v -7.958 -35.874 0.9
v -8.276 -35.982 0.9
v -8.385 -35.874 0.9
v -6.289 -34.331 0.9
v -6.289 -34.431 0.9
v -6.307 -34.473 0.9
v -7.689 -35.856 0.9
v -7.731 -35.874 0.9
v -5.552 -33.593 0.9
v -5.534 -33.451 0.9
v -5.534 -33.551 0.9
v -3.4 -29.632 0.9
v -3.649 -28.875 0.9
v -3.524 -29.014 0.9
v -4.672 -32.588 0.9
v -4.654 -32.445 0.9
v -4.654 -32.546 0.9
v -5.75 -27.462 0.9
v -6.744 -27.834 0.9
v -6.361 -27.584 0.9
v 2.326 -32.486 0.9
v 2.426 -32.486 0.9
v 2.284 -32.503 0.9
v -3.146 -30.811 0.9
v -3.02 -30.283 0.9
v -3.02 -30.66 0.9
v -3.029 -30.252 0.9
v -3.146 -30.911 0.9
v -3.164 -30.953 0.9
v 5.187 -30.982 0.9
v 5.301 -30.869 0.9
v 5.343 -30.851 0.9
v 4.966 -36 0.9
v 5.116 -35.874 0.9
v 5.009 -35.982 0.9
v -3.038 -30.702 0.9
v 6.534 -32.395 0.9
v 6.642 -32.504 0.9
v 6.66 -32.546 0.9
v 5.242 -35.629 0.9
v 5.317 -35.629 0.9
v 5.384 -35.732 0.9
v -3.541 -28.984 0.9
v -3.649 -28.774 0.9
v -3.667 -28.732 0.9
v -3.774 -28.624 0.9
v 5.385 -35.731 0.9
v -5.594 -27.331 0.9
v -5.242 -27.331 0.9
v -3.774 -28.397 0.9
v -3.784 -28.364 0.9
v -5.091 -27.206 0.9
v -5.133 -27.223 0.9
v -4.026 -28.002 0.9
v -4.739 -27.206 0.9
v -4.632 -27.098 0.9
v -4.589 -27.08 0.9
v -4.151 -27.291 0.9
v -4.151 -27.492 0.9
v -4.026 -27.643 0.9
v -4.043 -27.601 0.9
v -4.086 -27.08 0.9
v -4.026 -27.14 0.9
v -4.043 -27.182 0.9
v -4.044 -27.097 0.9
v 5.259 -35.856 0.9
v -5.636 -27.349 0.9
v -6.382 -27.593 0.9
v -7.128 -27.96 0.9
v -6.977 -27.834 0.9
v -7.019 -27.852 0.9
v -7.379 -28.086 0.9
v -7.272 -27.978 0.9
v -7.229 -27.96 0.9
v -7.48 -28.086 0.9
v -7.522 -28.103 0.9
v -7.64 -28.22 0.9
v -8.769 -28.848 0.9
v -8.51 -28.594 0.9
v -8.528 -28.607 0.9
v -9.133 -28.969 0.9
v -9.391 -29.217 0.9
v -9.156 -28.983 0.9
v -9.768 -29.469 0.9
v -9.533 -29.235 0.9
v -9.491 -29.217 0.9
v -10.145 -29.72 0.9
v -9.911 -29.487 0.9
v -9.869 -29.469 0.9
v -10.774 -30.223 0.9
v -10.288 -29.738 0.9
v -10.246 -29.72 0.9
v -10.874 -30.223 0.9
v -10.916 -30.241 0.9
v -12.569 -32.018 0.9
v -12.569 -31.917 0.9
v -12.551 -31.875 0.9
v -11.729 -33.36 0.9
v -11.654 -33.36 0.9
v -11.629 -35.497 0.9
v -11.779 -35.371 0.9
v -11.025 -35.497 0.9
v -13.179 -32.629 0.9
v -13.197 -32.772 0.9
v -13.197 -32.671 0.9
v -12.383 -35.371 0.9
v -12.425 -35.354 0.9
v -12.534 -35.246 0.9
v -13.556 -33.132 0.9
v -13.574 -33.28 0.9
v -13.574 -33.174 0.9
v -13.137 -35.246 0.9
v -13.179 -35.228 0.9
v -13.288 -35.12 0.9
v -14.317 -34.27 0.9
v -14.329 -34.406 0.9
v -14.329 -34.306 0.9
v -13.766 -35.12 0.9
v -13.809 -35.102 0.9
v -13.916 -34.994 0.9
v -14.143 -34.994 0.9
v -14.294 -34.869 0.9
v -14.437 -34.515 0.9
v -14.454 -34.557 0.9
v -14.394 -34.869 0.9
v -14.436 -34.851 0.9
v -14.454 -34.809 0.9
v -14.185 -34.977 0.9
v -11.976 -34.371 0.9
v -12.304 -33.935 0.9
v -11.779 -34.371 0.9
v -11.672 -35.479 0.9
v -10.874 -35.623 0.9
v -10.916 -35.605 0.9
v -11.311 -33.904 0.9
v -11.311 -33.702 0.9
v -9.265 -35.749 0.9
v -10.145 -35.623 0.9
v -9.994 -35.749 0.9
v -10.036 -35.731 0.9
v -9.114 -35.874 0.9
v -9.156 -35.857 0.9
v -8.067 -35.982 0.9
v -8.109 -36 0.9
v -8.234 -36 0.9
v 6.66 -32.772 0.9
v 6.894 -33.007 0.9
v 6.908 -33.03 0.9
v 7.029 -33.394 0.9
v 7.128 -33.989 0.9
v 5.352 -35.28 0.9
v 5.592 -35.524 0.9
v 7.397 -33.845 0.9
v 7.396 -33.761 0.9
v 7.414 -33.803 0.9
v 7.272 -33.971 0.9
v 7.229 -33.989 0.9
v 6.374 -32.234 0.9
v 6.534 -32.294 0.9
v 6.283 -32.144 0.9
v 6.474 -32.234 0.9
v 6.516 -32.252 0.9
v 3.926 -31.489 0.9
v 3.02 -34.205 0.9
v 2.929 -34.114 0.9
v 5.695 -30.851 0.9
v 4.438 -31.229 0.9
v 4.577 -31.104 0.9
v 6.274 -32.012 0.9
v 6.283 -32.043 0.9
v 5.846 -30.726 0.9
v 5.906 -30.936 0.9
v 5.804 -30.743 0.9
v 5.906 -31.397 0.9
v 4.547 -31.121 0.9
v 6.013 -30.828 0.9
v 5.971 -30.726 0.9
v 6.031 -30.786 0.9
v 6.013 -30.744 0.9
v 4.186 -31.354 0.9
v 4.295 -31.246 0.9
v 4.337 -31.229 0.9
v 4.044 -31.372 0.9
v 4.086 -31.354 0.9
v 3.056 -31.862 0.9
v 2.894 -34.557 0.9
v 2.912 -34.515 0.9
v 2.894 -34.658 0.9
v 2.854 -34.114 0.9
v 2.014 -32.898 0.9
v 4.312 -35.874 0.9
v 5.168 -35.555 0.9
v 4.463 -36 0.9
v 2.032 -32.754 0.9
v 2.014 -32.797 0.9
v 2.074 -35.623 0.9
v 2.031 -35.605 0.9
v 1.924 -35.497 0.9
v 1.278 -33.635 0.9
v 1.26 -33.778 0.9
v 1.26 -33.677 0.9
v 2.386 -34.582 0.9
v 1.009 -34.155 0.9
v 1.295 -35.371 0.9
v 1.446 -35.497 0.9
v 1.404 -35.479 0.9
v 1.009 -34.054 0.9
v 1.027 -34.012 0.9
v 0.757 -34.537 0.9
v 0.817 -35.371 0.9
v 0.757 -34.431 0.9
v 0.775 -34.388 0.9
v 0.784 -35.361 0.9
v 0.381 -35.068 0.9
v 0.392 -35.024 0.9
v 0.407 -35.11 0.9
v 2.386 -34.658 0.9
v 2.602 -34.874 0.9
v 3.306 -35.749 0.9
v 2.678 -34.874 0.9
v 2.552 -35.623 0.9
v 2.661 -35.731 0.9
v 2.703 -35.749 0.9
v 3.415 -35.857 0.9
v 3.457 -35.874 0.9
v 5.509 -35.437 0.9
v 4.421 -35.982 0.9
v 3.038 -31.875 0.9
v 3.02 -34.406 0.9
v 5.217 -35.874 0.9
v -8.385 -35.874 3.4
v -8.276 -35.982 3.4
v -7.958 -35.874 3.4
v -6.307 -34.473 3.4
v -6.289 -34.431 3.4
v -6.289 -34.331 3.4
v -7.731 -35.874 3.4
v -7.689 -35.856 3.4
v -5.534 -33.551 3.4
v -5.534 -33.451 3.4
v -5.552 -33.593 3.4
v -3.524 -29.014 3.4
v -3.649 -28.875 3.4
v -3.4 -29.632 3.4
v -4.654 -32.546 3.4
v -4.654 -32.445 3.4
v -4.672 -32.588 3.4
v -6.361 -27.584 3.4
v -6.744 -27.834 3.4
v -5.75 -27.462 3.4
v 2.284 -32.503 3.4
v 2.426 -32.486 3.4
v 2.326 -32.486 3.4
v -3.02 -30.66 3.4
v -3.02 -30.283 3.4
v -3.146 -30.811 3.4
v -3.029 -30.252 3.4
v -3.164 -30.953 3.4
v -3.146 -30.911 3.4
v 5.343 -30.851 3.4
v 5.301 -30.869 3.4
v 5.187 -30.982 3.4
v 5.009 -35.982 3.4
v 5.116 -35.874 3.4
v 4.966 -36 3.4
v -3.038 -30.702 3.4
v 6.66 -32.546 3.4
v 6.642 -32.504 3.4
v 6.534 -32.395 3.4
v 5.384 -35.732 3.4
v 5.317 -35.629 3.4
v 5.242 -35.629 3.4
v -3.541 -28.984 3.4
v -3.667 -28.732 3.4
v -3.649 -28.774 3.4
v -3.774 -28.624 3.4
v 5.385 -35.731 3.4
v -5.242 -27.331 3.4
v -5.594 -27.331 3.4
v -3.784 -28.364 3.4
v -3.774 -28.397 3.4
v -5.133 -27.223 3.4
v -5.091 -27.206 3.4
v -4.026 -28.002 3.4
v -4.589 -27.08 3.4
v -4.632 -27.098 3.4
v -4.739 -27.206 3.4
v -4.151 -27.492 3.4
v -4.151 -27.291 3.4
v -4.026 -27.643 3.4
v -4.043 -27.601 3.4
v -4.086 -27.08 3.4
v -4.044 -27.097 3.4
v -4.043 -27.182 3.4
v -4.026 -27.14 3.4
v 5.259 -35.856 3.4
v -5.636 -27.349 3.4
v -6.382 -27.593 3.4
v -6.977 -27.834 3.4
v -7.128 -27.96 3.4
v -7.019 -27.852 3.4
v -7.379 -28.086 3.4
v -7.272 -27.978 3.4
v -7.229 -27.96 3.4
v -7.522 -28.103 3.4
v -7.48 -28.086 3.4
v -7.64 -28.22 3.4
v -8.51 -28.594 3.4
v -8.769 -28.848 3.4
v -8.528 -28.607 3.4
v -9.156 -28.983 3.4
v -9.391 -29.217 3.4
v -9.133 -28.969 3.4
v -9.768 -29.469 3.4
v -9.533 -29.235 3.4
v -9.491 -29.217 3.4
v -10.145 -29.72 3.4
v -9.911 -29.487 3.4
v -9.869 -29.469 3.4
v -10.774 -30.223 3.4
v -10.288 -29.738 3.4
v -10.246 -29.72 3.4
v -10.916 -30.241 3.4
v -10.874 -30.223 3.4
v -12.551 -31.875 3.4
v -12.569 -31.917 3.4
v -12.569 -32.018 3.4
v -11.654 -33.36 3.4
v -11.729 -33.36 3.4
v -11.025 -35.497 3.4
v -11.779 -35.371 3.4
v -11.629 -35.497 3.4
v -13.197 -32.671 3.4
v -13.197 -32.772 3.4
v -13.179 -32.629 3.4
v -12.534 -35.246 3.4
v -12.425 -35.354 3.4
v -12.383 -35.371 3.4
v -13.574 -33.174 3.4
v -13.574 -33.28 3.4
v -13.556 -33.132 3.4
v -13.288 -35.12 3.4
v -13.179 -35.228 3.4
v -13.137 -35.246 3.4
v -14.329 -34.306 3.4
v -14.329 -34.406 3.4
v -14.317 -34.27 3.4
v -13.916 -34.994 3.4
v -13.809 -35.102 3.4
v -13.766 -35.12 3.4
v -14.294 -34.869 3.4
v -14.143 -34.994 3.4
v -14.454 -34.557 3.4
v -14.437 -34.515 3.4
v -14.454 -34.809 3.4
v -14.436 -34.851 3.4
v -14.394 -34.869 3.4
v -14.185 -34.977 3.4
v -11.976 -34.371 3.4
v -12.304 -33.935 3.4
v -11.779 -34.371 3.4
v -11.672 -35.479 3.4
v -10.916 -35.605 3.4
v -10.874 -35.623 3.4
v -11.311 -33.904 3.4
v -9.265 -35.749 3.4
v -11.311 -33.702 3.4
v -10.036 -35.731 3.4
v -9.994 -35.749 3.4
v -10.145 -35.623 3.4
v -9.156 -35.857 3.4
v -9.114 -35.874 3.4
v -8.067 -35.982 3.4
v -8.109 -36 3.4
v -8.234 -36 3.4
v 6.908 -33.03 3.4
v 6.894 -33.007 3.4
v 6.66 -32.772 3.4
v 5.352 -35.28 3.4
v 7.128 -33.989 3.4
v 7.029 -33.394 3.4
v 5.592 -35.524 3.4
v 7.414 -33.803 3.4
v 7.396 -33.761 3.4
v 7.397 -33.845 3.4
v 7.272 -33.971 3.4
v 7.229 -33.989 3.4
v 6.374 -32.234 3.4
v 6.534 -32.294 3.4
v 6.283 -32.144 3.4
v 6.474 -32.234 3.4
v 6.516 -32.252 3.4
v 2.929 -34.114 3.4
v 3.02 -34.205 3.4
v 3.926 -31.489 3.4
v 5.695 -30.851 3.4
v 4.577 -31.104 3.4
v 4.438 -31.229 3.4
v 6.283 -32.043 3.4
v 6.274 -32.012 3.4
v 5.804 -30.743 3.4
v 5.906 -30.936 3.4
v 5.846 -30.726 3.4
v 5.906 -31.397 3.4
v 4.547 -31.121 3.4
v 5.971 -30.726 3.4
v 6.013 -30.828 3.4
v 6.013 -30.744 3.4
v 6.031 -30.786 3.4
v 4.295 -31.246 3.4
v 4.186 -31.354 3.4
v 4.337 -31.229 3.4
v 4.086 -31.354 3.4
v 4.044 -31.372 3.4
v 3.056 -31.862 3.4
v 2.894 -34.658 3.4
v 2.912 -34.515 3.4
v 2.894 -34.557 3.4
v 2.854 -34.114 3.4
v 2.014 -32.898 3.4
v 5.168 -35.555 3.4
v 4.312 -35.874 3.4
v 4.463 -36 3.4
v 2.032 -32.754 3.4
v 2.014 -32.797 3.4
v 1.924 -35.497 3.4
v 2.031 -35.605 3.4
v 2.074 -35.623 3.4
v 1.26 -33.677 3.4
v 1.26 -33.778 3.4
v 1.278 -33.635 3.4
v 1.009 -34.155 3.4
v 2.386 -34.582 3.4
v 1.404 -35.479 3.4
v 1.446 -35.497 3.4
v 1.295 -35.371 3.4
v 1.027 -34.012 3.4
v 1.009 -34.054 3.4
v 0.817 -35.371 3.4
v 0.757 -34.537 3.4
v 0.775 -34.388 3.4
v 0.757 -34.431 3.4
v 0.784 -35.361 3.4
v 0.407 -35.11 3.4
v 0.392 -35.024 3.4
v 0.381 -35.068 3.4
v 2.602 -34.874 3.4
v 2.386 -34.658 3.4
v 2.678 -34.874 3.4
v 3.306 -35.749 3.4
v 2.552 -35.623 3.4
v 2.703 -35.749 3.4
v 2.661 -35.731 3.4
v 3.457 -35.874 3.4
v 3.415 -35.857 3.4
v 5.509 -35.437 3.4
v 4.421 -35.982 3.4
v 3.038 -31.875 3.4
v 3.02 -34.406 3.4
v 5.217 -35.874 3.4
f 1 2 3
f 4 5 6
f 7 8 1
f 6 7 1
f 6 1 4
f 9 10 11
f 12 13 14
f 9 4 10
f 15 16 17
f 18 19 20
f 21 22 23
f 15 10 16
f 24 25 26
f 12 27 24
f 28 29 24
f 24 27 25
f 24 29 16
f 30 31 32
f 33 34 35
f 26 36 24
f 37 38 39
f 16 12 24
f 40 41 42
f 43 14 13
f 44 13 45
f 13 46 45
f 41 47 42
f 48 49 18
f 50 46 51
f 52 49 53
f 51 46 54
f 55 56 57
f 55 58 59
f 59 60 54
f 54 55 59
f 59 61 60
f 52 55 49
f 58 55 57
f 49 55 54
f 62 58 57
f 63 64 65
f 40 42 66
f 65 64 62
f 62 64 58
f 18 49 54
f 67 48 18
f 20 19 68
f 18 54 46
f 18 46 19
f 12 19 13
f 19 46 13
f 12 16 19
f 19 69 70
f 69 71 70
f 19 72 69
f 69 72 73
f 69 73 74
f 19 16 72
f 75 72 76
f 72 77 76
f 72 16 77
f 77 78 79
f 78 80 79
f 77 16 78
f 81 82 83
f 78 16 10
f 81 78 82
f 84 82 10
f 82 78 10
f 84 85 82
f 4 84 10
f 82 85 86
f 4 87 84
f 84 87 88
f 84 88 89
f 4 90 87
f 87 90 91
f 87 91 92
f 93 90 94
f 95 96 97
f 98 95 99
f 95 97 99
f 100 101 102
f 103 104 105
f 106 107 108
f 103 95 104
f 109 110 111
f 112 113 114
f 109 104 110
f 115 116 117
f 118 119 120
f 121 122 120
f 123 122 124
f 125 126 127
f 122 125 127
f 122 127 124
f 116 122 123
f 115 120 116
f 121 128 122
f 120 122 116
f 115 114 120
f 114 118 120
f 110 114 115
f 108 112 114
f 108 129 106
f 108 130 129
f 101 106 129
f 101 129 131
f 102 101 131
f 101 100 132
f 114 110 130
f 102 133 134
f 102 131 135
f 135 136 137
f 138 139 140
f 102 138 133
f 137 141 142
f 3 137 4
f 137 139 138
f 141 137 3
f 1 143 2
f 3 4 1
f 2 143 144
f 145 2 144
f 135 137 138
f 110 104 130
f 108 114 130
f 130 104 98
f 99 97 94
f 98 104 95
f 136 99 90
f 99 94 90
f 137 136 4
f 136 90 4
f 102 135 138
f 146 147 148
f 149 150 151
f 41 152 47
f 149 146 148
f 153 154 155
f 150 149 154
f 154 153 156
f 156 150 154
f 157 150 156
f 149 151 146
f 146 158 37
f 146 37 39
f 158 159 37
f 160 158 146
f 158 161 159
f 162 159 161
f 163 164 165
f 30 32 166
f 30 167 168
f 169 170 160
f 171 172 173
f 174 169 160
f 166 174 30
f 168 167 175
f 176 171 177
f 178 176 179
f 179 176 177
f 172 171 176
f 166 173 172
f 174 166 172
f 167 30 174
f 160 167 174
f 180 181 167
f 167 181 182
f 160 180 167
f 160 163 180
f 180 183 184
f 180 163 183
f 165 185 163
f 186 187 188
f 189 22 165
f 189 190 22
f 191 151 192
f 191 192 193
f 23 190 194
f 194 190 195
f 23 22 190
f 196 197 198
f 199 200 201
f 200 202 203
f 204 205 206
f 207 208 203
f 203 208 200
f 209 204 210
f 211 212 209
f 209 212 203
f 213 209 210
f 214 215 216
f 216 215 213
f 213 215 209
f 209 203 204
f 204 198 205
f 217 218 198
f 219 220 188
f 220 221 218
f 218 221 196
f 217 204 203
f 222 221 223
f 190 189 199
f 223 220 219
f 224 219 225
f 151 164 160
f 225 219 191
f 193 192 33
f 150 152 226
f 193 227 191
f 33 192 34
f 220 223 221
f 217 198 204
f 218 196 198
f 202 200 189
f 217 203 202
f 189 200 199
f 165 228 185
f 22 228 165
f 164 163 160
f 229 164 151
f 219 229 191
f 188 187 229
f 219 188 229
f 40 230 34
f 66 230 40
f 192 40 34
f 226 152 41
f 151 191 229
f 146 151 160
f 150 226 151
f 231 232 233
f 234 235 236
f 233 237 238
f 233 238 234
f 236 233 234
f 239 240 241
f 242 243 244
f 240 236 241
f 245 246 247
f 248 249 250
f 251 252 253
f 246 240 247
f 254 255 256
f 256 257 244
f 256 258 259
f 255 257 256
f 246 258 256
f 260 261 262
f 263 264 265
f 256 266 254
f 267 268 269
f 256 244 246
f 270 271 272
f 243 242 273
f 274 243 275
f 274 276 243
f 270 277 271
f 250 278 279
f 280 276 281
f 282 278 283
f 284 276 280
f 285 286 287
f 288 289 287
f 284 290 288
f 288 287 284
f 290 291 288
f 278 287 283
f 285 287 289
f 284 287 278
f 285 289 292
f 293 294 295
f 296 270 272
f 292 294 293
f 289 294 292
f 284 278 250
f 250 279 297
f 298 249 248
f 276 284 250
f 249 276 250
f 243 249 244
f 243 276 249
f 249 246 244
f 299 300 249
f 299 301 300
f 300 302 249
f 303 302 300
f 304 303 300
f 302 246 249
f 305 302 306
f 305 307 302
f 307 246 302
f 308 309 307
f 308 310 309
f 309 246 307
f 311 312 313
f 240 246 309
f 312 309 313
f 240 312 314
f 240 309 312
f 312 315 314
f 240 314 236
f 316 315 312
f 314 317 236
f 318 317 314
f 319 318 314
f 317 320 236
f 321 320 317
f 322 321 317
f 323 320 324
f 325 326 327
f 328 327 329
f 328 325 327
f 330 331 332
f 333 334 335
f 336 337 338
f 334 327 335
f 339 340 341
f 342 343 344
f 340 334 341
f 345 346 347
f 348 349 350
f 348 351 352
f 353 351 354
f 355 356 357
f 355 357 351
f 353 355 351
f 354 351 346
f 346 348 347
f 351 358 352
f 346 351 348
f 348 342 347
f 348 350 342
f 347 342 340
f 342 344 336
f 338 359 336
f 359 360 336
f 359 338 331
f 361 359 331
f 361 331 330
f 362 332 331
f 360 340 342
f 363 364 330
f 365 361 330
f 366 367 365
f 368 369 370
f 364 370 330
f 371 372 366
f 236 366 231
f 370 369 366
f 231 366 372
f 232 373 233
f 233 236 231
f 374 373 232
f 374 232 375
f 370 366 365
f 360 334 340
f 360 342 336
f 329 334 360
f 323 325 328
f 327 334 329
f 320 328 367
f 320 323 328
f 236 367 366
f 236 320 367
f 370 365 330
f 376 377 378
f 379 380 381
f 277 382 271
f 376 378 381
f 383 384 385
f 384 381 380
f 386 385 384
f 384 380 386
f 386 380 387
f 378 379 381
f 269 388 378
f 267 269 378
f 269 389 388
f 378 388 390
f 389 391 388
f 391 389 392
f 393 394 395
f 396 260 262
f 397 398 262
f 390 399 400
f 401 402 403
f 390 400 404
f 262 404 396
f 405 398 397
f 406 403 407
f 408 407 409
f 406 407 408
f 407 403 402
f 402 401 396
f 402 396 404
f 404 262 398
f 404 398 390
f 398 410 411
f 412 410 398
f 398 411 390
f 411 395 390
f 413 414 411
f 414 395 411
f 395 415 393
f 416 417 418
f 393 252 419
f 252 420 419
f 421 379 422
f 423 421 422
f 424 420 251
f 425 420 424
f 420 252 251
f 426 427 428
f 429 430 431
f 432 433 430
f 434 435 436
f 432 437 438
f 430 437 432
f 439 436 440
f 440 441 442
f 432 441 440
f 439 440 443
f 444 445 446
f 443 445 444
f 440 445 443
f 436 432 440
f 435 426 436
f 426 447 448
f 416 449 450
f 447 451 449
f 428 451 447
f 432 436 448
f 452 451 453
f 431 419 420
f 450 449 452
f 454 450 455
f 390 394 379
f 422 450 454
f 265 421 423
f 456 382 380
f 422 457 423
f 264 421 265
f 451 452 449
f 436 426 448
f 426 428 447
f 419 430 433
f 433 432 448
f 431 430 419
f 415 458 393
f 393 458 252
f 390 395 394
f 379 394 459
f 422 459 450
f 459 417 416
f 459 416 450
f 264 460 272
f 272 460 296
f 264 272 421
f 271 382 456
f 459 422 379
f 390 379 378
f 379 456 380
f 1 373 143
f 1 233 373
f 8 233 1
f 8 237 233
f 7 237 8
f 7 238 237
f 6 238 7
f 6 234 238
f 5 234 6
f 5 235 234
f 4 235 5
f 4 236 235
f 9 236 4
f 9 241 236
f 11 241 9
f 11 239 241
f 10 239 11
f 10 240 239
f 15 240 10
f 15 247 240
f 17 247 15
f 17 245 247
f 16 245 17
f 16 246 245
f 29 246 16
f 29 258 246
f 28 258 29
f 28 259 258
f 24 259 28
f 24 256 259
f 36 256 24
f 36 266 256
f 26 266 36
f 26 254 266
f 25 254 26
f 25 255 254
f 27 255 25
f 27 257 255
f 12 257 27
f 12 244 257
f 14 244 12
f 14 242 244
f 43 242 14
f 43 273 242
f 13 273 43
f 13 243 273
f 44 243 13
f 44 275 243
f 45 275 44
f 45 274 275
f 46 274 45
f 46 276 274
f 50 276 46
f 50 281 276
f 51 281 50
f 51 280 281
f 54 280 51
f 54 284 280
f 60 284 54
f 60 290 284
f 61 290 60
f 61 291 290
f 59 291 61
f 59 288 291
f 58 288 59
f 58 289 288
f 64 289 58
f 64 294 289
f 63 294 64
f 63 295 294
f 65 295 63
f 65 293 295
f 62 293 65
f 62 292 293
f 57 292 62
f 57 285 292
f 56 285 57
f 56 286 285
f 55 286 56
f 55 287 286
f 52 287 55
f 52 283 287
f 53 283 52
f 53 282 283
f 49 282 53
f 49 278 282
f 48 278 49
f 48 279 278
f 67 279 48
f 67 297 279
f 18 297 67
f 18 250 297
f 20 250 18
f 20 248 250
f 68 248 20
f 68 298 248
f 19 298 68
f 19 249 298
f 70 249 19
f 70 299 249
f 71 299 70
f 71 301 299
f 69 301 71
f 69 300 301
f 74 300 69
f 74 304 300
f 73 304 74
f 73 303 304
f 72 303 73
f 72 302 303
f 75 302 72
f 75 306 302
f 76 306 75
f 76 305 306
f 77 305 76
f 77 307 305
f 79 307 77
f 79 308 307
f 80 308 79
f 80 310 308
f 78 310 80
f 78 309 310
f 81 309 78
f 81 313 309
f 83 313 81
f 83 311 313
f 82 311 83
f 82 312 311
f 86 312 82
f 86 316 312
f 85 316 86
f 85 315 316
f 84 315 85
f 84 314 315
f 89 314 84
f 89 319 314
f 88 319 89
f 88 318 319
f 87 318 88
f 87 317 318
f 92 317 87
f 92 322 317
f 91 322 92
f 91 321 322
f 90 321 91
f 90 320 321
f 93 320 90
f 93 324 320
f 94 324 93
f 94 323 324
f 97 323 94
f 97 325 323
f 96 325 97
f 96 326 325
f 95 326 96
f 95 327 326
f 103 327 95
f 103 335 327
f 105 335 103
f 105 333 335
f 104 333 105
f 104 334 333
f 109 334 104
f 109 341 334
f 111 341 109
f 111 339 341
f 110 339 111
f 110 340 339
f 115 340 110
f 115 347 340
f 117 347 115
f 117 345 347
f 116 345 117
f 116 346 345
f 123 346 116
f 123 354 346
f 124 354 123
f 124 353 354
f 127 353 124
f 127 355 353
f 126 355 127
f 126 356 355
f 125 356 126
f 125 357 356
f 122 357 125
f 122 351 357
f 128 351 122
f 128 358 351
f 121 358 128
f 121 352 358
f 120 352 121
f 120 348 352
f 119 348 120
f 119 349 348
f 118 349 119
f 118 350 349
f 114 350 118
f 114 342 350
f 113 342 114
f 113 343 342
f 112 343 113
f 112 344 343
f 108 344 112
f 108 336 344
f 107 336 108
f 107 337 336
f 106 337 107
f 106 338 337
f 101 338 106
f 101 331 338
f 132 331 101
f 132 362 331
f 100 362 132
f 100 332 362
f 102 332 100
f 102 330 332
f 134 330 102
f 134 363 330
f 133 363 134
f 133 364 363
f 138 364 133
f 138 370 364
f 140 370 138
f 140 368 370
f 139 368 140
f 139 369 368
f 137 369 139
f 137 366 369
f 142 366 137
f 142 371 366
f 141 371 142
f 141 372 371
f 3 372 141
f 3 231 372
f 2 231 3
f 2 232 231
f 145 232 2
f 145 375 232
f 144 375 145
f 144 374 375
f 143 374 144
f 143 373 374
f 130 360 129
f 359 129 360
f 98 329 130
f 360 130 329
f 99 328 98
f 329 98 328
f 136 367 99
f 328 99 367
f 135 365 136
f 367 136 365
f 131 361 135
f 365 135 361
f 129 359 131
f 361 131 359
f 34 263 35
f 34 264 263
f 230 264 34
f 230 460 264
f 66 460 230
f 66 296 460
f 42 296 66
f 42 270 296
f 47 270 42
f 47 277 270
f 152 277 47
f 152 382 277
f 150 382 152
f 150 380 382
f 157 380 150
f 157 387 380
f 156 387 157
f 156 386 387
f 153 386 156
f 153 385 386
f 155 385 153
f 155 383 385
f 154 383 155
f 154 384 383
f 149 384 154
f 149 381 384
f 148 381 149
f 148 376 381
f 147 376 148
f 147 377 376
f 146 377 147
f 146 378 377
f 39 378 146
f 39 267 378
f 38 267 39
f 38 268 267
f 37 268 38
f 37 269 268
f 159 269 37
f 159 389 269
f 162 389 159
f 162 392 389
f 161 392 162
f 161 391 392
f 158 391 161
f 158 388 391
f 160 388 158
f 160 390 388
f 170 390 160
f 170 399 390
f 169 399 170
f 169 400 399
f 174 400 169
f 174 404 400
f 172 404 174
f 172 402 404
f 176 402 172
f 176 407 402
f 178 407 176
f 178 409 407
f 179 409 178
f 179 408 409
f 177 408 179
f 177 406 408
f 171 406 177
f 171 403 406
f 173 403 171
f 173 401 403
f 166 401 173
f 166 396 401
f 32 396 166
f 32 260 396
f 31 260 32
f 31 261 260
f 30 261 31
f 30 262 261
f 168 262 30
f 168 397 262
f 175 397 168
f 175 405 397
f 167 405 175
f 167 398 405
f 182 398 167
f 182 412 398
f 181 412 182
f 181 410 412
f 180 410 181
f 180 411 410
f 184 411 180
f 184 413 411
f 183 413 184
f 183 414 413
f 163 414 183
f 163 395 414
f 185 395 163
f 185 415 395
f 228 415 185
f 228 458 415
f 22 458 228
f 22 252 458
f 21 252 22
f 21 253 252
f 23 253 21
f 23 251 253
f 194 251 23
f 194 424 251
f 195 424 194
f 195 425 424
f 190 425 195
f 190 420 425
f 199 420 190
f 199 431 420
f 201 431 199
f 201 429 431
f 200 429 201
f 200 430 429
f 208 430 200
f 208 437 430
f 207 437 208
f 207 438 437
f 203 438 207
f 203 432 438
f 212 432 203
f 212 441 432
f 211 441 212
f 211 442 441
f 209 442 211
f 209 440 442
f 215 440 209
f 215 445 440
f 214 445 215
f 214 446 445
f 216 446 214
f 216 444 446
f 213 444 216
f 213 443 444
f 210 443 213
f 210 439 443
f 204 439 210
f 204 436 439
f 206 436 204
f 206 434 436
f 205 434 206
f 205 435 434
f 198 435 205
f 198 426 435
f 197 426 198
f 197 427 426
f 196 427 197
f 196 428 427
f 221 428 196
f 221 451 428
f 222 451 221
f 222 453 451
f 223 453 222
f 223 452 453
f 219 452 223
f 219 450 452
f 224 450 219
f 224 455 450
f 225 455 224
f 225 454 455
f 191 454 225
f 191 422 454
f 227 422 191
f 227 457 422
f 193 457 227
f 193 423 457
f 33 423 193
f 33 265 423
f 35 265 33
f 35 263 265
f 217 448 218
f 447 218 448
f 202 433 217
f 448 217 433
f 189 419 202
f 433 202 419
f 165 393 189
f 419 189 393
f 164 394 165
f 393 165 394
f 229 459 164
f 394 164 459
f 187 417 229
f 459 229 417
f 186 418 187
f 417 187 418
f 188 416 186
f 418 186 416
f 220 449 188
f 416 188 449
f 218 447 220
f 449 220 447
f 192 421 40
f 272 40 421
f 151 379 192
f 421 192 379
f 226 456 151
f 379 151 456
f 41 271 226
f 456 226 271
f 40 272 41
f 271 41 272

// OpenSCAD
$fn = 24;
translate([0, -2.500, 0.900])
  linear_extrude(height=2.500) {
offset(r=0.06, $fn=8) {
    polygon(points=[[6.097,-28.286],[5.846,-28.286],[5.720,-28.411],[5.343,-28.411],[5.217,-28.537],[4.589,-28.663],[4.463,-28.789],[4.337,-28.789],[4.211,-28.914],[4.086,-28.914],[3.960,-29.040],[3.080,-29.417],[2.451,-30.046],[2.326,-30.046],[2.074,-30.297],[2.074,-30.423],[1.320,-31.177],[1.320,-31.303],[1.069,-31.554],[1.069,-31.680],[0.817,-31.931],[0.817,-32.057],[0.440,-32.560],[0.817,-32.811],[1.320,-32.811],[1.446,-32.937],[1.949,-32.937],[2.074,-33.063],[2.577,-33.063],[2.703,-33.189],[3.331,-33.189],[3.457,-33.314],[4.337,-33.314],[4.463,-33.440],[4.966,-33.440],[5.091,-33.314],[5.217,-33.314],[7.103,-31.429],[7.229,-31.429],[7.354,-31.303],[6.977,-30.926],[6.851,-30.549],[6.600,-30.297],[6.600,-30.046],[6.474,-29.920],[6.474,-29.794],[6.349,-29.794],[6.223,-29.669],[6.223,-29.543],[5.846,-28.914],[5.846,-28.411],[5.971,-28.286],[5.091,-33.063],[5.343,-32.686],[5.594,-32.937],[5.343,-33.189],[5.217,-33.189],[2.954,-31.554],[3.080,-31.680],[3.080,-31.931],[2.954,-32.057],[2.954,-32.183],[2.703,-32.434],[2.577,-32.434],[2.326,-32.183],[2.326,-32.057],[2.829,-31.554]], paths=[[0,1,2,3,4,5,6,7,8,9,10,11,12,13,14,15,16,17,18,19,20,21,22,23,24,25,26,27,28,29,30,31,32,33,34,35,36,37,38,39,40,41,42,43,44,45,46,47,48,49,50,51],[52,53,54,55,56],[57,58,59,60,61,62,63,64,65,66]]);
    polygon(points=[[-4.086,-24.640],[-4.589,-24.640],[-4.714,-24.766],[-5.091,-24.766],[-5.217,-24.891],[-5.594,-24.891],[-5.720,-25.017],[-6.349,-25.143],[-6.726,-25.394],[-6.977,-25.394],[-7.103,-25.520],[-7.229,-25.520],[-7.354,-25.646],[-7.480,-25.646],[-7.606,-25.771],[-8.486,-26.149],[-8.737,-26.400],[-9.114,-26.526],[-9.366,-26.777],[-9.491,-26.777],[-9.743,-27.029],[-9.869,-27.029],[-10.120,-27.280],[-10.246,-27.280],[-10.749,-27.783],[-10.874,-27.783],[-12.509,-29.417],[-12.509,-29.543],[-13.137,-30.171],[-13.137,-30.297],[-13.514,-30.674],[-13.514,-30.800],[-14.269,-31.806],[-14.269,-31.931],[-14.394,-32.057],[-14.394,-32.309],[-14.269,-32.309],[-14.143,-32.434],[-13.891,-32.434],[-13.766,-32.560],[-13.263,-32.560],[-13.137,-32.686],[-12.509,-32.686],[-12.383,-32.811],[-11.754,-32.811],[-11.629,-32.937],[-11.000,-32.937],[-10.874,-33.063],[-10.120,-33.063],[-9.994,-33.189],[-9.240,-33.189],[-9.114,-33.314],[-8.360,-33.314],[-8.234,-33.440],[-8.109,-33.440],[-7.983,-33.314],[-7.731,-33.314],[-6.349,-31.931],[-6.349,-31.806],[-5.594,-31.051],[-5.594,-30.926],[-4.714,-30.046],[-4.714,-29.920],[-3.206,-28.411],[-3.206,-28.286],[-3.080,-28.160],[-3.080,-27.783],[-3.457,-27.154],[-3.583,-26.526],[-3.709,-26.400],[-3.709,-26.274],[-3.834,-26.149],[-3.834,-25.897],[-4.086,-25.520],[-4.086,-25.143],[-4.211,-25.017],[-4.211,-24.766],[-11.629,-30.800],[-11.251,-31.177],[-11.251,-31.429],[-11.754,-31.931],[-12.006,-31.931],[-12.383,-31.429],[-11.754,-30.800]], paths=[[0,1,2,3,4,5,6,7,8,9,10,11,12,13,14,15,16,17,18,19,20,21,22,23,24,25,26,27,28,29,30,31,32,33,34,35,36,37,38,39,40,41,42,43,44,45,46,47,48,49,50,51,52,53,54,55,56,57,58,59,60,61,62,63,64,65,66,67,68,69,70,71,72,73,74,75,76],[77,78,79,80,81,82,83]]);
}
}
